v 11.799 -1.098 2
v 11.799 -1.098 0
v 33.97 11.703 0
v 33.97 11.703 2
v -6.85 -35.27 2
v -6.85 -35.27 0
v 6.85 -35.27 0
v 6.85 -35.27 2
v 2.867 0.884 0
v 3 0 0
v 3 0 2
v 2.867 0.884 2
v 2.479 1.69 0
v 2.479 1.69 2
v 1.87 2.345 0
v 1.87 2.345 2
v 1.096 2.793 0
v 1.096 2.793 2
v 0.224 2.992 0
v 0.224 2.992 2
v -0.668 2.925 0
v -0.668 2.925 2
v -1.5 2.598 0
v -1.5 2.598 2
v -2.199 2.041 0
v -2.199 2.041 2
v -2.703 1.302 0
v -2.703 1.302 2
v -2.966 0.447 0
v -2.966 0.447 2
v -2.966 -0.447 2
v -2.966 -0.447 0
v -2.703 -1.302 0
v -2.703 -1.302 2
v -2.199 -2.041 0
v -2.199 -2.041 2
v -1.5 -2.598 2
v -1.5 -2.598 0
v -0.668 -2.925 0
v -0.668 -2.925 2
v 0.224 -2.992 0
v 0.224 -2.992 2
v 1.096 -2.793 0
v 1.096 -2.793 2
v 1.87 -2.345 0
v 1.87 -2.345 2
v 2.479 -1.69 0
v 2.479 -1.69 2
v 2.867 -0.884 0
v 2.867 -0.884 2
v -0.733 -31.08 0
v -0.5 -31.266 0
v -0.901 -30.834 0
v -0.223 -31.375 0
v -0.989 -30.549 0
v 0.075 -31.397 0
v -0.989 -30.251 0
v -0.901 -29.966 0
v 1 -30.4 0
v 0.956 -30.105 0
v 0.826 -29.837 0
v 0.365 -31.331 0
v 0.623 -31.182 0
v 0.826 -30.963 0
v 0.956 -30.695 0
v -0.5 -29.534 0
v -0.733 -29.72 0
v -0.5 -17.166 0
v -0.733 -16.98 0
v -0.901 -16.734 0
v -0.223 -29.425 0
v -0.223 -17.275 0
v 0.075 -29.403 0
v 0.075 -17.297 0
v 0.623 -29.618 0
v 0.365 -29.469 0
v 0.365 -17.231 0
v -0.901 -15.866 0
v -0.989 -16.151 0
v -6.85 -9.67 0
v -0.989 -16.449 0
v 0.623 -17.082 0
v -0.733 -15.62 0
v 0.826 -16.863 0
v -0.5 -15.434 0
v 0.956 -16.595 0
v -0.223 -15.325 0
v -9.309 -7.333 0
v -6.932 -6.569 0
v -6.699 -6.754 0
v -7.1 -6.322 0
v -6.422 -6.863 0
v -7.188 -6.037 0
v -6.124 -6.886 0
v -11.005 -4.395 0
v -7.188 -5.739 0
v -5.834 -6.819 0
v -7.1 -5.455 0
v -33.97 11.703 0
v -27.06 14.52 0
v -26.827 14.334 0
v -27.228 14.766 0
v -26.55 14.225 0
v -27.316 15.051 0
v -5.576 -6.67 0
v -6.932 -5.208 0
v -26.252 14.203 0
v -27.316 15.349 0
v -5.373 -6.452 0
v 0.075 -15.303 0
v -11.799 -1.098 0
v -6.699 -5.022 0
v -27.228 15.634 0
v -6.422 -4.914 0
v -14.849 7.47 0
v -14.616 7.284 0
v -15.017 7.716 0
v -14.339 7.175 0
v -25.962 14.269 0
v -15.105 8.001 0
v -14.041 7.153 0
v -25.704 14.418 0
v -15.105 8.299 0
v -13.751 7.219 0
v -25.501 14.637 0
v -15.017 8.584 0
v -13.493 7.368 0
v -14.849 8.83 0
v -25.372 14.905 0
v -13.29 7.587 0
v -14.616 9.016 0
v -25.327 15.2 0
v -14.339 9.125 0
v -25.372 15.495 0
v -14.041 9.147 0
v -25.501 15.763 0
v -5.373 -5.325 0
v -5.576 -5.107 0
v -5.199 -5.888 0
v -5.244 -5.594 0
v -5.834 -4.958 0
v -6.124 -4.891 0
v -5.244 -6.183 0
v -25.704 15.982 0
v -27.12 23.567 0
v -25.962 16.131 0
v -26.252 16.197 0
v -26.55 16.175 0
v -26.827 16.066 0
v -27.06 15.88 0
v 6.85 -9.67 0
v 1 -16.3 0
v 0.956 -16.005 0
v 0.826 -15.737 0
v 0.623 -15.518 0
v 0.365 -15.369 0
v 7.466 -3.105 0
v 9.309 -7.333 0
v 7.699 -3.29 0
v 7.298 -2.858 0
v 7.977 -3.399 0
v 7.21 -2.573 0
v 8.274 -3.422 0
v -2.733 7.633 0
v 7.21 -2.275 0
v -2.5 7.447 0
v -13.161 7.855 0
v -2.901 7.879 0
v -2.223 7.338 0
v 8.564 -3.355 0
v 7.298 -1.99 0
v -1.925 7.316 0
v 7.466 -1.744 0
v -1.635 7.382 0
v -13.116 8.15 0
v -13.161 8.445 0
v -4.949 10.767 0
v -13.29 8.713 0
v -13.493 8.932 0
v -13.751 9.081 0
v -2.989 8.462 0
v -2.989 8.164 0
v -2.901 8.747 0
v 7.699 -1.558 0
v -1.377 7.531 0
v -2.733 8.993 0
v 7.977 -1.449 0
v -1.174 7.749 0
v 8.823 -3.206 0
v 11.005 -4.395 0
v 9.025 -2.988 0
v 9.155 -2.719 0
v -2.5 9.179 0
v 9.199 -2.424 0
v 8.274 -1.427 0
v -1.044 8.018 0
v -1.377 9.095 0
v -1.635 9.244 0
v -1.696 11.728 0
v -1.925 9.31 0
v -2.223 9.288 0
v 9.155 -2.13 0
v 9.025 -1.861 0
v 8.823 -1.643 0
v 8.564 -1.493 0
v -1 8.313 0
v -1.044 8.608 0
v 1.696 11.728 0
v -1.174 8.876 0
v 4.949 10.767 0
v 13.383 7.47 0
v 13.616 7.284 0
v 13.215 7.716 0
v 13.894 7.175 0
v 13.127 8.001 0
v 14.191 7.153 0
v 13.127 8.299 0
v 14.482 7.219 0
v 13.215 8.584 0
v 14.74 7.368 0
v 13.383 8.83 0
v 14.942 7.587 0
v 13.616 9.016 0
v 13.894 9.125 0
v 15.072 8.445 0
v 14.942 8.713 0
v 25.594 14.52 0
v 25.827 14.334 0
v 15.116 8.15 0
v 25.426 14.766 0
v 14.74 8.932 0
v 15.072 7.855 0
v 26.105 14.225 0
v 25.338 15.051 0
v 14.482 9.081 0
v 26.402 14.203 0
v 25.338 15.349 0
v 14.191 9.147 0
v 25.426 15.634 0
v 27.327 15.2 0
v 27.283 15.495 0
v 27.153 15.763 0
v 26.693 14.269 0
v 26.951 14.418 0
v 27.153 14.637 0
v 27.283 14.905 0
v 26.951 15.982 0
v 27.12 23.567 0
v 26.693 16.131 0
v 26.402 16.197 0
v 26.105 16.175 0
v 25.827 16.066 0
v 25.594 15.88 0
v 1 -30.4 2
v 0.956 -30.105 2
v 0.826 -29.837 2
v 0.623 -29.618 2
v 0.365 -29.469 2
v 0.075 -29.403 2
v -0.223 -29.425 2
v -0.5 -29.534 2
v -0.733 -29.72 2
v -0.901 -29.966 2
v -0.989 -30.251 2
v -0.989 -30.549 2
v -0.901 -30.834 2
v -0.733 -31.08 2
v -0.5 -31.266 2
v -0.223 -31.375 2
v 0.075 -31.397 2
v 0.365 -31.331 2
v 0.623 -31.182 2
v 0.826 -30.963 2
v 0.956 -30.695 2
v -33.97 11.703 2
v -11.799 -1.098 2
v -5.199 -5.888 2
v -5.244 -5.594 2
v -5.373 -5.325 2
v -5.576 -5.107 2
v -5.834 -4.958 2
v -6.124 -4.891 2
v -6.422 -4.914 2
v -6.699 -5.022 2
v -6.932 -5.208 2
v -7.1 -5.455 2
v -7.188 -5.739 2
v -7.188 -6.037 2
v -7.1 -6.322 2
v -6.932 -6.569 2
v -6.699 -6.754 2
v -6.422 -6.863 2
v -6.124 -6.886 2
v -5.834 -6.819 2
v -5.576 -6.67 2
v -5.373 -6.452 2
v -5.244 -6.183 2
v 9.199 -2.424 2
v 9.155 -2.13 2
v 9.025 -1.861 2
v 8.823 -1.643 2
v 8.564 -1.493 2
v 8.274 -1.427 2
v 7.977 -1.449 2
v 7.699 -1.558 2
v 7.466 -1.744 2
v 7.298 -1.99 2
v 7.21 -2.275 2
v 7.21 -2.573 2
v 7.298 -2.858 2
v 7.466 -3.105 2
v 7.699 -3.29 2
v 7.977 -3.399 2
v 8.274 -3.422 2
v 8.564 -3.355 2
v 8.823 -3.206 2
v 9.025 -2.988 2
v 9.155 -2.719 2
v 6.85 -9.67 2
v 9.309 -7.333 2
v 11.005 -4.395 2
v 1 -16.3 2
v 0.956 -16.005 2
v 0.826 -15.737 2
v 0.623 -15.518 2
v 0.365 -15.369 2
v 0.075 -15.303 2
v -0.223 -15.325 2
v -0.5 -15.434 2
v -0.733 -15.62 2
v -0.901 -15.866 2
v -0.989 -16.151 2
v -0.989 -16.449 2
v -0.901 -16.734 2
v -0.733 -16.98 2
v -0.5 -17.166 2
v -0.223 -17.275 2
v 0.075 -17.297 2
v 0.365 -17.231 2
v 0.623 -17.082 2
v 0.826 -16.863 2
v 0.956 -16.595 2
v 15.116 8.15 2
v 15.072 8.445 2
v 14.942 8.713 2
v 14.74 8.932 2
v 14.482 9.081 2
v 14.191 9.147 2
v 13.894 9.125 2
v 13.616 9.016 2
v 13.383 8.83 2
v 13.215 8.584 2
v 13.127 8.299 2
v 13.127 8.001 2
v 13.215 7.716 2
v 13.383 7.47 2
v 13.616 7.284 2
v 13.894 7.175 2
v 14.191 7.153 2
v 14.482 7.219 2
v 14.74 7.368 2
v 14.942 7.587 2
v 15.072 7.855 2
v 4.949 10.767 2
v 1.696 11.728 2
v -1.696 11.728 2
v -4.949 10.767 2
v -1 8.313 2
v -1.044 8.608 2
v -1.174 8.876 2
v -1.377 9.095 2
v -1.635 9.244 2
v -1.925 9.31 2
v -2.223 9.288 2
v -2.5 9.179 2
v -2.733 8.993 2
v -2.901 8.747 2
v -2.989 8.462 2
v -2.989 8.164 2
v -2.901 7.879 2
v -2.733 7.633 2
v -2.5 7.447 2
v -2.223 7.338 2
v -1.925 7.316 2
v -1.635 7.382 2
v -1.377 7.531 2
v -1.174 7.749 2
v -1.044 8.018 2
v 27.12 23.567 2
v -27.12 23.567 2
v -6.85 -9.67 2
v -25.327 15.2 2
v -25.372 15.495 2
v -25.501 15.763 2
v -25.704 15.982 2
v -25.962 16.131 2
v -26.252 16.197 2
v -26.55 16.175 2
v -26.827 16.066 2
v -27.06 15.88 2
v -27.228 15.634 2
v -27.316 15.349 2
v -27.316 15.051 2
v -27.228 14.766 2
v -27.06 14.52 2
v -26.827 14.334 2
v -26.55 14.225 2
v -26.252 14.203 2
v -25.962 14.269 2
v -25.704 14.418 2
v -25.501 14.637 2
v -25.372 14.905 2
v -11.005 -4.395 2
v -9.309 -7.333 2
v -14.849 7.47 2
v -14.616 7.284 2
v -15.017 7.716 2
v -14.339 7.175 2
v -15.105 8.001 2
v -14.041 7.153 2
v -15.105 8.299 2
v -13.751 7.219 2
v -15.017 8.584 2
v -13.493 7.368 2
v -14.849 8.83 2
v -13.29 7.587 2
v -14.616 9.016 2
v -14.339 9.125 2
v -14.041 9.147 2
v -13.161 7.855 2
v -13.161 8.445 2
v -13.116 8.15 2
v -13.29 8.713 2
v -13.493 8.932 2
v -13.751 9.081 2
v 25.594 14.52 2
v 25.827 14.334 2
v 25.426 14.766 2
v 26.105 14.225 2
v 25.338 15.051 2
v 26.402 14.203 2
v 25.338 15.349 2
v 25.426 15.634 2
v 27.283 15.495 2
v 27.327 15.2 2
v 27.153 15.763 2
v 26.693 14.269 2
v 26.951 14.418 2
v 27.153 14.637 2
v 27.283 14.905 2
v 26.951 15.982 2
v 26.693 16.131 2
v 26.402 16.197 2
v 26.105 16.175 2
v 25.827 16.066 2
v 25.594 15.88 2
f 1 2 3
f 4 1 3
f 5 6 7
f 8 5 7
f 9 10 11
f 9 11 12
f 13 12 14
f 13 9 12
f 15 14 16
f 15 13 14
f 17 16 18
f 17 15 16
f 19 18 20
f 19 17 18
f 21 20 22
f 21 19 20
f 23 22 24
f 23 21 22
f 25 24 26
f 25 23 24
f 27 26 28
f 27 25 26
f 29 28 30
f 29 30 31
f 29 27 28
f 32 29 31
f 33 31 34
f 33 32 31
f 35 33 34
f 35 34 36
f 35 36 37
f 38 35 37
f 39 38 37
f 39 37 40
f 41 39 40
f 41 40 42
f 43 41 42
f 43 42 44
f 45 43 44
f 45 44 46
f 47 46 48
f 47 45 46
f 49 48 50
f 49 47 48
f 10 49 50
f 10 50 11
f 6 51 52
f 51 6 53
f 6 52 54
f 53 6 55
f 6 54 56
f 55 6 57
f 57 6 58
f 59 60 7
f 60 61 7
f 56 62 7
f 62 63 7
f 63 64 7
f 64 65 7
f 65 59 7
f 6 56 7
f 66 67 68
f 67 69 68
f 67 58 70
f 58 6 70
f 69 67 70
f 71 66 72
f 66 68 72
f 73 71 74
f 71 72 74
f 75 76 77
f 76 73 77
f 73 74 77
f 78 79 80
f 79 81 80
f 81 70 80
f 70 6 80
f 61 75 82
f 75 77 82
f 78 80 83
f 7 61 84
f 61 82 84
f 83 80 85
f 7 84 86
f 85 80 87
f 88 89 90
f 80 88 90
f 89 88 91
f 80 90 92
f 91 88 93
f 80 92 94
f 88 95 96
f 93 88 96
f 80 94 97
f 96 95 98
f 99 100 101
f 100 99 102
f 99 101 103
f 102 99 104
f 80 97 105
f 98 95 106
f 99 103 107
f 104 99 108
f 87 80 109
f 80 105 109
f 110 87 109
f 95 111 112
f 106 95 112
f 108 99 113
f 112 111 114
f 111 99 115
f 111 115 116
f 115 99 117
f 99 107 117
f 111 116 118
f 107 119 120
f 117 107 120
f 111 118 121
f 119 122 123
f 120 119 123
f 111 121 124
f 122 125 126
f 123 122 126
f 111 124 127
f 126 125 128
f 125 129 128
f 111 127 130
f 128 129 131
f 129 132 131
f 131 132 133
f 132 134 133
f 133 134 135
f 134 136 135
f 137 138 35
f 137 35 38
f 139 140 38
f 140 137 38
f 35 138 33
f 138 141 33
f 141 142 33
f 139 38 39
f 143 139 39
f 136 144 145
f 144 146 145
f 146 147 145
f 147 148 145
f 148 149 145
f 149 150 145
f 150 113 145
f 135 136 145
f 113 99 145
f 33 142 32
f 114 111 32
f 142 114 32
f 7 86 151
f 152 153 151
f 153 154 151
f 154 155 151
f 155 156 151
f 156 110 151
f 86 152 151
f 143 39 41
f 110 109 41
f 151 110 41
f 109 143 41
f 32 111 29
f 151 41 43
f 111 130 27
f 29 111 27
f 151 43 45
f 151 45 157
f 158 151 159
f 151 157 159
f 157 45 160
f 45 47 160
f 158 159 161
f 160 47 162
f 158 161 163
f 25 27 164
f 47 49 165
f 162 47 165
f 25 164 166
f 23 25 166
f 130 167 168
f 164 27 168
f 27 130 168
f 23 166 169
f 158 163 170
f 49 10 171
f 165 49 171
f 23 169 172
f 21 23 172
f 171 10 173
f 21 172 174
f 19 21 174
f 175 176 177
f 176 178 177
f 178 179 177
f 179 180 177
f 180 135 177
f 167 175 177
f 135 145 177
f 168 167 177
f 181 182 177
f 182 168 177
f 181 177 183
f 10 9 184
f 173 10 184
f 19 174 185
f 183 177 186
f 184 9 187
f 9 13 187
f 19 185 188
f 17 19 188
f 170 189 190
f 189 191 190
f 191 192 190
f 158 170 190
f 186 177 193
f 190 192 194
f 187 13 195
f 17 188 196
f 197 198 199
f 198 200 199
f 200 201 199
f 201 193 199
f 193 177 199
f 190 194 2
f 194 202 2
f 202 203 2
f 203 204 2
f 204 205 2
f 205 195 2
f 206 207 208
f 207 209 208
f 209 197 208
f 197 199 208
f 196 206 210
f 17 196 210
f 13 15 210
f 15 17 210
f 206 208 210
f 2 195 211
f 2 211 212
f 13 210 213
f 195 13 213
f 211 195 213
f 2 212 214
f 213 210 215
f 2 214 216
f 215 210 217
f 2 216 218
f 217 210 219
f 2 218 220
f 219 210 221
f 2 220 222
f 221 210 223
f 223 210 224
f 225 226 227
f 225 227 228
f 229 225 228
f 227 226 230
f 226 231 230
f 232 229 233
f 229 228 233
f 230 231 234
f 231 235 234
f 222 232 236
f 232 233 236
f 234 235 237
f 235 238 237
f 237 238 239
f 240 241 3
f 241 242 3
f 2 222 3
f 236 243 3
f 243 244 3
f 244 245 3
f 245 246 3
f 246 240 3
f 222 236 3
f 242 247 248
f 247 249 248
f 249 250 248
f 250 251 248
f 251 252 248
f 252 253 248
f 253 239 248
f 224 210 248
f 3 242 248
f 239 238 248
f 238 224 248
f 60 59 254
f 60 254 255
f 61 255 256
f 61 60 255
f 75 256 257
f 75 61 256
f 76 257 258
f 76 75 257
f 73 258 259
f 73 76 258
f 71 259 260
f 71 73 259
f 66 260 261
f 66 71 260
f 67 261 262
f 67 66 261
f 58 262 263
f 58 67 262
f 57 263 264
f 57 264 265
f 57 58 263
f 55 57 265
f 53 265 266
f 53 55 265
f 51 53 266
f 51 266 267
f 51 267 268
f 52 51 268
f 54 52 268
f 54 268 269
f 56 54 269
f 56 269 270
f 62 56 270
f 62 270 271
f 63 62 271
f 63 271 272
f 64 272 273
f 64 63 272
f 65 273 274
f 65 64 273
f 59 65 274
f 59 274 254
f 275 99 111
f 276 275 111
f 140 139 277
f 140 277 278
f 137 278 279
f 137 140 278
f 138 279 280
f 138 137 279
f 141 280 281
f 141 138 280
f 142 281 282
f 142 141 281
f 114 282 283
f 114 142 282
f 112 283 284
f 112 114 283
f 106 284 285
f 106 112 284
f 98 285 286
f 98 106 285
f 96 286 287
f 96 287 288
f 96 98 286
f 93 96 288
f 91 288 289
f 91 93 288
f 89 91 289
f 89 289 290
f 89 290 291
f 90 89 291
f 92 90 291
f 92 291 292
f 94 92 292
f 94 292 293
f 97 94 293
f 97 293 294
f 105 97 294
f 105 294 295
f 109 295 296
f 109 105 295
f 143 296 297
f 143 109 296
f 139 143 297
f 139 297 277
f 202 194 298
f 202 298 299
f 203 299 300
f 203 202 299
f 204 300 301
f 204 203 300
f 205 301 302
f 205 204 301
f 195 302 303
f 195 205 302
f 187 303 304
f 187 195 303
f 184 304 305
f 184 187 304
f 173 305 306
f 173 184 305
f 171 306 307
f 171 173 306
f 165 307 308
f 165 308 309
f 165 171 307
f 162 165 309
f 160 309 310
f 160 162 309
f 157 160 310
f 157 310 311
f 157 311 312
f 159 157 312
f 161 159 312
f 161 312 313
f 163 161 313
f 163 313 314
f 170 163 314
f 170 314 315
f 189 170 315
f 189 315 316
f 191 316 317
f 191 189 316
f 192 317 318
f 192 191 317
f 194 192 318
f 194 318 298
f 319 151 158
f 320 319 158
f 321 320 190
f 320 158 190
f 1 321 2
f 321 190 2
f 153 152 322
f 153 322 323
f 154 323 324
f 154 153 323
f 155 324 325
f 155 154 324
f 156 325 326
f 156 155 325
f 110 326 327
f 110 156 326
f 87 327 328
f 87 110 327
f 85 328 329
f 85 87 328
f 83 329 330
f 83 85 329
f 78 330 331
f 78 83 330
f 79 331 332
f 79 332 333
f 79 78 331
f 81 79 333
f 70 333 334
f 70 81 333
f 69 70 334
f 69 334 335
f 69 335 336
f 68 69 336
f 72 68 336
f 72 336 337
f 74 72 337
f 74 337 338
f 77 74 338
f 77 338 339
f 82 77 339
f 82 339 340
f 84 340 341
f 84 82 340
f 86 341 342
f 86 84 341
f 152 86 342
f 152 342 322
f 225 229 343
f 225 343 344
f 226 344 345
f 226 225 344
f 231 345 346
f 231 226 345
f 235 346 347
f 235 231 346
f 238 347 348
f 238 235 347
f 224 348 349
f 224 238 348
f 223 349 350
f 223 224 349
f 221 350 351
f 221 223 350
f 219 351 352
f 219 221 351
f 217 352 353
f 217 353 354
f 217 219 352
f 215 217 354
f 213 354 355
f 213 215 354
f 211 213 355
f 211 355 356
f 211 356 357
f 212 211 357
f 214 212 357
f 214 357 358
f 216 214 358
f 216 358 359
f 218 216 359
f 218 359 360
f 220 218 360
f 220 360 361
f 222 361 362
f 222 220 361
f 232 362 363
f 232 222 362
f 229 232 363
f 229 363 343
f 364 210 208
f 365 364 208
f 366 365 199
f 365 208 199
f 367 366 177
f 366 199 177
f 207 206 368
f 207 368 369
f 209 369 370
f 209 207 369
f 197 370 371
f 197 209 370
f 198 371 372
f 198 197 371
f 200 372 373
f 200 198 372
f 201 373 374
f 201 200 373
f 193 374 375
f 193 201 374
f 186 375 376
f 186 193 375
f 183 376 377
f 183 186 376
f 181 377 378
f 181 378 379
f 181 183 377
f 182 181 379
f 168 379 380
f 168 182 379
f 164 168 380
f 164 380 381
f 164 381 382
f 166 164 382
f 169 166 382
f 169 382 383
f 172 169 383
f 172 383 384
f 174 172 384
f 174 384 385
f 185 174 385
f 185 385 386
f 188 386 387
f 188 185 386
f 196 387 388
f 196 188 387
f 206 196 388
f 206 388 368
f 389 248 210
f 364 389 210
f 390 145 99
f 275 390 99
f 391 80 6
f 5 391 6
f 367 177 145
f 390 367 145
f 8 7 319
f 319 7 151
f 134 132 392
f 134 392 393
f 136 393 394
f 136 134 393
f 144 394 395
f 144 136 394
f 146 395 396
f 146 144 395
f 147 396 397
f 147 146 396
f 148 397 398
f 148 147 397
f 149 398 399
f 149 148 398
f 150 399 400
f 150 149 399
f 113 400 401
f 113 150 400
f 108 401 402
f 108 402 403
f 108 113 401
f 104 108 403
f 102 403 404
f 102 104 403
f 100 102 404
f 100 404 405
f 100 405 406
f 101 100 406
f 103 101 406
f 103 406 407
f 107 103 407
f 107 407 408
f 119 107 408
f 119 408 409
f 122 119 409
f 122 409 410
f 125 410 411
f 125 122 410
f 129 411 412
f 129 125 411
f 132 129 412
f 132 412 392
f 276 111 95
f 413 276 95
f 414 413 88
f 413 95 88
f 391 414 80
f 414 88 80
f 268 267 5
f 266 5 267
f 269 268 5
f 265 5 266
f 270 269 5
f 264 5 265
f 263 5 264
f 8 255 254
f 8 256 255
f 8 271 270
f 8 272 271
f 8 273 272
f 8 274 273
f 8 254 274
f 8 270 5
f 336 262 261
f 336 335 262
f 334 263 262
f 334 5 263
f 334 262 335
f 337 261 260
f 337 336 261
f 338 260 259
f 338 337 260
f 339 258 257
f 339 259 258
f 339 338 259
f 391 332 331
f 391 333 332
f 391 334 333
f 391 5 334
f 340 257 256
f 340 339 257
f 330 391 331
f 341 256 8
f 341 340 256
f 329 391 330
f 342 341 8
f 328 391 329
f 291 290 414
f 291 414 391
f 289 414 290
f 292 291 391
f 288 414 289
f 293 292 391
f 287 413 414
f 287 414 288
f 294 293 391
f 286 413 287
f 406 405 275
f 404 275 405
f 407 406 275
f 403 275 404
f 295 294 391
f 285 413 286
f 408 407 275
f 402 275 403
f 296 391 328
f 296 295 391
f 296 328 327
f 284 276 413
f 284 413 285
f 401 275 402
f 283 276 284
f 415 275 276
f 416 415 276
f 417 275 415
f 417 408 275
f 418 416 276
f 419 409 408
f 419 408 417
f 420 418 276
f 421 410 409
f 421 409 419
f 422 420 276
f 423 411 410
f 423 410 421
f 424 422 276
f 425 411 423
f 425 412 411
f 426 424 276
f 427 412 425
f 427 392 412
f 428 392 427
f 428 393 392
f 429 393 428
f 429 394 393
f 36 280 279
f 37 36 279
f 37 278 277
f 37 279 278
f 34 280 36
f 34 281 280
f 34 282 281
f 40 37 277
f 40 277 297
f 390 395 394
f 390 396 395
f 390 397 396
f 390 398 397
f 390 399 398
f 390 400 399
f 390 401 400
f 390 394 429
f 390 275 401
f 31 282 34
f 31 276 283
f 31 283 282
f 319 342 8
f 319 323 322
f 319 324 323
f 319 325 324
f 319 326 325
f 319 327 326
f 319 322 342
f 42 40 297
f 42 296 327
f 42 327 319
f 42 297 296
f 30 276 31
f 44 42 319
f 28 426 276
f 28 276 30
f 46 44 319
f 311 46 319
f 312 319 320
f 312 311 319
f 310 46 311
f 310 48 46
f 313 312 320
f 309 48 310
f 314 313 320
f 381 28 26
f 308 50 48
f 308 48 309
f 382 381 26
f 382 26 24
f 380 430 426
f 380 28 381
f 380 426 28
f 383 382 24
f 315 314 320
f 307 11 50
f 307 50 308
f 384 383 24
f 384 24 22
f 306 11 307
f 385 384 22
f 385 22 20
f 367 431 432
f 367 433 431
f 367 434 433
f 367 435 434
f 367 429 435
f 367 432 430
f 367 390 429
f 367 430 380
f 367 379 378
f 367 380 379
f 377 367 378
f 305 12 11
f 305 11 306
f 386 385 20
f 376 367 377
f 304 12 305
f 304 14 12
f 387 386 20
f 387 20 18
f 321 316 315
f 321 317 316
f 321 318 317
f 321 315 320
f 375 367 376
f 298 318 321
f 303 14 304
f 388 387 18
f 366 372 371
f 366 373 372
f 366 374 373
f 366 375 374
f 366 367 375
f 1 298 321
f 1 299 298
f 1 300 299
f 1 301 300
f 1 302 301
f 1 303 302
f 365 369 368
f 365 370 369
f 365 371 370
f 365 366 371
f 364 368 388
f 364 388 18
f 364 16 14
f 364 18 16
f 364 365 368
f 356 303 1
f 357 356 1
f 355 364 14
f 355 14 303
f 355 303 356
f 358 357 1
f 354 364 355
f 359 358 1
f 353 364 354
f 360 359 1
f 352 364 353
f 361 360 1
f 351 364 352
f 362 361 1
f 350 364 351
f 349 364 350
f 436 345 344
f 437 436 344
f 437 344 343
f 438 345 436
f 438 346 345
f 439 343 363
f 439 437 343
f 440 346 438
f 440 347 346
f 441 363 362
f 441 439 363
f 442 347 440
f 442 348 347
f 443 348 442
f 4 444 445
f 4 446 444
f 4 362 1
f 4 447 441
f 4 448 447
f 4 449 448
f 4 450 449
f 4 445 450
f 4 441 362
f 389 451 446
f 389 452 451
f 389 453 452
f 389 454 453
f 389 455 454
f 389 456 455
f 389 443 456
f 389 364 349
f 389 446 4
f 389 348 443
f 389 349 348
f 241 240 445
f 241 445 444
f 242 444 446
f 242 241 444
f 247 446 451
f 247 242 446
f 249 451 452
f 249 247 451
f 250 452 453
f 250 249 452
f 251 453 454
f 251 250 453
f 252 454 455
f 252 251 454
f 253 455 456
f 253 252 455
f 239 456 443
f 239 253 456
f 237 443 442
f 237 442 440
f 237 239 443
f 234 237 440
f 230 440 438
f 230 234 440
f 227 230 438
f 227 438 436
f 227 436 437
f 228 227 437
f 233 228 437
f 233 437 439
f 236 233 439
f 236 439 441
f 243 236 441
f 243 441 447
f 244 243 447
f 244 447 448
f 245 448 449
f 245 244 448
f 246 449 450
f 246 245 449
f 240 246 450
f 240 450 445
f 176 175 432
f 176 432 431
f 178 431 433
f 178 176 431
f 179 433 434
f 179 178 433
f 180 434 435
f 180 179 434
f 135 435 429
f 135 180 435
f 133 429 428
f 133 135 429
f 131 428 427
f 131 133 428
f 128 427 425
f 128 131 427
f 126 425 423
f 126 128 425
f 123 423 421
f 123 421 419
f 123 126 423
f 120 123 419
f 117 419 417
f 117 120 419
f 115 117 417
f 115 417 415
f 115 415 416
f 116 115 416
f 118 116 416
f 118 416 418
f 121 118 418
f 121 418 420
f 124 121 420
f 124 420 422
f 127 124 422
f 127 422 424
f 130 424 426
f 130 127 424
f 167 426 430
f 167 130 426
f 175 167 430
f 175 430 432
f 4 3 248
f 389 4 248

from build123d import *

# Parameters (mm, degrees)
F0_R     = 1
F0_R_2   = 3
F1_DEPTH = 2


with BuildPart() as f1:
    # F0 (on Top) → F1 (new body)
    with BuildSketch(Plane.XY):
        with BuildLine():
            Line((6.85, -35.27), (6.85, -9.66954))
            ThreePointArc((6.85, -9.66954), (10.262401, -5.925), (11.799067, -1.097504))
            Line((11.799067, -1.097504), (33.969716, 11.702726))
            Line((33.969716, 11.702726), (27.119716, 23.567274))
            Line((27.119716, 23.567274), (4.949067, 10.767044))
            ThreePointArc((4.949067, 10.767044), (0, 11.85), (-4.949067, 10.767044))
            Line((-4.949067, 10.767044), (-27.119716, 23.567274))
            Line((-27.119716, 23.567274), (-33.969716, 11.702726))
            Line((-33.969716, 11.702726), (-11.799067, -1.097504))
            ThreePointArc((-11.799067, -1.097504), (-10.262401, -5.925), (-6.85, -9.66954))
            Line((-6.85, -9.66954), (-6.85, -35.27))
            Line((-6.85, -35.27), (6.85, -35.27))
        make_face()
        with Locations((0, -30.4)):
            Circle(F0_R, mode=Mode.SUBTRACT)
        with Locations((0, -16.3)):
            Circle(F0_R, mode=Mode.SUBTRACT)
        with Locations((-6.199088, -5.888446)):
            Circle(F0_R, mode=Mode.SUBTRACT)
        Circle(F0_R_2, mode=Mode.SUBTRACT)
        with Locations((-14.116214, 8.15)):
            Circle(F0_R, mode=Mode.SUBTRACT)
        with Locations((-2, 8.312791)):
            Circle(F0_R, mode=Mode.SUBTRACT)
        with Locations((-26.327172, 15.2)):
            Circle(F0_R, mode=Mode.SUBTRACT)
        with Locations((8.199088, -2.424345)):
            Circle(F0_R, mode=Mode.SUBTRACT)
        with Locations((14.116214, 8.15)):
            Circle(F0_R, mode=Mode.SUBTRACT)
        with Locations((26.327172, 15.2)):
            Circle(F0_R, mode=Mode.SUBTRACT)
    extrude(amount=F1_DEPTH)


solid = f1.part
